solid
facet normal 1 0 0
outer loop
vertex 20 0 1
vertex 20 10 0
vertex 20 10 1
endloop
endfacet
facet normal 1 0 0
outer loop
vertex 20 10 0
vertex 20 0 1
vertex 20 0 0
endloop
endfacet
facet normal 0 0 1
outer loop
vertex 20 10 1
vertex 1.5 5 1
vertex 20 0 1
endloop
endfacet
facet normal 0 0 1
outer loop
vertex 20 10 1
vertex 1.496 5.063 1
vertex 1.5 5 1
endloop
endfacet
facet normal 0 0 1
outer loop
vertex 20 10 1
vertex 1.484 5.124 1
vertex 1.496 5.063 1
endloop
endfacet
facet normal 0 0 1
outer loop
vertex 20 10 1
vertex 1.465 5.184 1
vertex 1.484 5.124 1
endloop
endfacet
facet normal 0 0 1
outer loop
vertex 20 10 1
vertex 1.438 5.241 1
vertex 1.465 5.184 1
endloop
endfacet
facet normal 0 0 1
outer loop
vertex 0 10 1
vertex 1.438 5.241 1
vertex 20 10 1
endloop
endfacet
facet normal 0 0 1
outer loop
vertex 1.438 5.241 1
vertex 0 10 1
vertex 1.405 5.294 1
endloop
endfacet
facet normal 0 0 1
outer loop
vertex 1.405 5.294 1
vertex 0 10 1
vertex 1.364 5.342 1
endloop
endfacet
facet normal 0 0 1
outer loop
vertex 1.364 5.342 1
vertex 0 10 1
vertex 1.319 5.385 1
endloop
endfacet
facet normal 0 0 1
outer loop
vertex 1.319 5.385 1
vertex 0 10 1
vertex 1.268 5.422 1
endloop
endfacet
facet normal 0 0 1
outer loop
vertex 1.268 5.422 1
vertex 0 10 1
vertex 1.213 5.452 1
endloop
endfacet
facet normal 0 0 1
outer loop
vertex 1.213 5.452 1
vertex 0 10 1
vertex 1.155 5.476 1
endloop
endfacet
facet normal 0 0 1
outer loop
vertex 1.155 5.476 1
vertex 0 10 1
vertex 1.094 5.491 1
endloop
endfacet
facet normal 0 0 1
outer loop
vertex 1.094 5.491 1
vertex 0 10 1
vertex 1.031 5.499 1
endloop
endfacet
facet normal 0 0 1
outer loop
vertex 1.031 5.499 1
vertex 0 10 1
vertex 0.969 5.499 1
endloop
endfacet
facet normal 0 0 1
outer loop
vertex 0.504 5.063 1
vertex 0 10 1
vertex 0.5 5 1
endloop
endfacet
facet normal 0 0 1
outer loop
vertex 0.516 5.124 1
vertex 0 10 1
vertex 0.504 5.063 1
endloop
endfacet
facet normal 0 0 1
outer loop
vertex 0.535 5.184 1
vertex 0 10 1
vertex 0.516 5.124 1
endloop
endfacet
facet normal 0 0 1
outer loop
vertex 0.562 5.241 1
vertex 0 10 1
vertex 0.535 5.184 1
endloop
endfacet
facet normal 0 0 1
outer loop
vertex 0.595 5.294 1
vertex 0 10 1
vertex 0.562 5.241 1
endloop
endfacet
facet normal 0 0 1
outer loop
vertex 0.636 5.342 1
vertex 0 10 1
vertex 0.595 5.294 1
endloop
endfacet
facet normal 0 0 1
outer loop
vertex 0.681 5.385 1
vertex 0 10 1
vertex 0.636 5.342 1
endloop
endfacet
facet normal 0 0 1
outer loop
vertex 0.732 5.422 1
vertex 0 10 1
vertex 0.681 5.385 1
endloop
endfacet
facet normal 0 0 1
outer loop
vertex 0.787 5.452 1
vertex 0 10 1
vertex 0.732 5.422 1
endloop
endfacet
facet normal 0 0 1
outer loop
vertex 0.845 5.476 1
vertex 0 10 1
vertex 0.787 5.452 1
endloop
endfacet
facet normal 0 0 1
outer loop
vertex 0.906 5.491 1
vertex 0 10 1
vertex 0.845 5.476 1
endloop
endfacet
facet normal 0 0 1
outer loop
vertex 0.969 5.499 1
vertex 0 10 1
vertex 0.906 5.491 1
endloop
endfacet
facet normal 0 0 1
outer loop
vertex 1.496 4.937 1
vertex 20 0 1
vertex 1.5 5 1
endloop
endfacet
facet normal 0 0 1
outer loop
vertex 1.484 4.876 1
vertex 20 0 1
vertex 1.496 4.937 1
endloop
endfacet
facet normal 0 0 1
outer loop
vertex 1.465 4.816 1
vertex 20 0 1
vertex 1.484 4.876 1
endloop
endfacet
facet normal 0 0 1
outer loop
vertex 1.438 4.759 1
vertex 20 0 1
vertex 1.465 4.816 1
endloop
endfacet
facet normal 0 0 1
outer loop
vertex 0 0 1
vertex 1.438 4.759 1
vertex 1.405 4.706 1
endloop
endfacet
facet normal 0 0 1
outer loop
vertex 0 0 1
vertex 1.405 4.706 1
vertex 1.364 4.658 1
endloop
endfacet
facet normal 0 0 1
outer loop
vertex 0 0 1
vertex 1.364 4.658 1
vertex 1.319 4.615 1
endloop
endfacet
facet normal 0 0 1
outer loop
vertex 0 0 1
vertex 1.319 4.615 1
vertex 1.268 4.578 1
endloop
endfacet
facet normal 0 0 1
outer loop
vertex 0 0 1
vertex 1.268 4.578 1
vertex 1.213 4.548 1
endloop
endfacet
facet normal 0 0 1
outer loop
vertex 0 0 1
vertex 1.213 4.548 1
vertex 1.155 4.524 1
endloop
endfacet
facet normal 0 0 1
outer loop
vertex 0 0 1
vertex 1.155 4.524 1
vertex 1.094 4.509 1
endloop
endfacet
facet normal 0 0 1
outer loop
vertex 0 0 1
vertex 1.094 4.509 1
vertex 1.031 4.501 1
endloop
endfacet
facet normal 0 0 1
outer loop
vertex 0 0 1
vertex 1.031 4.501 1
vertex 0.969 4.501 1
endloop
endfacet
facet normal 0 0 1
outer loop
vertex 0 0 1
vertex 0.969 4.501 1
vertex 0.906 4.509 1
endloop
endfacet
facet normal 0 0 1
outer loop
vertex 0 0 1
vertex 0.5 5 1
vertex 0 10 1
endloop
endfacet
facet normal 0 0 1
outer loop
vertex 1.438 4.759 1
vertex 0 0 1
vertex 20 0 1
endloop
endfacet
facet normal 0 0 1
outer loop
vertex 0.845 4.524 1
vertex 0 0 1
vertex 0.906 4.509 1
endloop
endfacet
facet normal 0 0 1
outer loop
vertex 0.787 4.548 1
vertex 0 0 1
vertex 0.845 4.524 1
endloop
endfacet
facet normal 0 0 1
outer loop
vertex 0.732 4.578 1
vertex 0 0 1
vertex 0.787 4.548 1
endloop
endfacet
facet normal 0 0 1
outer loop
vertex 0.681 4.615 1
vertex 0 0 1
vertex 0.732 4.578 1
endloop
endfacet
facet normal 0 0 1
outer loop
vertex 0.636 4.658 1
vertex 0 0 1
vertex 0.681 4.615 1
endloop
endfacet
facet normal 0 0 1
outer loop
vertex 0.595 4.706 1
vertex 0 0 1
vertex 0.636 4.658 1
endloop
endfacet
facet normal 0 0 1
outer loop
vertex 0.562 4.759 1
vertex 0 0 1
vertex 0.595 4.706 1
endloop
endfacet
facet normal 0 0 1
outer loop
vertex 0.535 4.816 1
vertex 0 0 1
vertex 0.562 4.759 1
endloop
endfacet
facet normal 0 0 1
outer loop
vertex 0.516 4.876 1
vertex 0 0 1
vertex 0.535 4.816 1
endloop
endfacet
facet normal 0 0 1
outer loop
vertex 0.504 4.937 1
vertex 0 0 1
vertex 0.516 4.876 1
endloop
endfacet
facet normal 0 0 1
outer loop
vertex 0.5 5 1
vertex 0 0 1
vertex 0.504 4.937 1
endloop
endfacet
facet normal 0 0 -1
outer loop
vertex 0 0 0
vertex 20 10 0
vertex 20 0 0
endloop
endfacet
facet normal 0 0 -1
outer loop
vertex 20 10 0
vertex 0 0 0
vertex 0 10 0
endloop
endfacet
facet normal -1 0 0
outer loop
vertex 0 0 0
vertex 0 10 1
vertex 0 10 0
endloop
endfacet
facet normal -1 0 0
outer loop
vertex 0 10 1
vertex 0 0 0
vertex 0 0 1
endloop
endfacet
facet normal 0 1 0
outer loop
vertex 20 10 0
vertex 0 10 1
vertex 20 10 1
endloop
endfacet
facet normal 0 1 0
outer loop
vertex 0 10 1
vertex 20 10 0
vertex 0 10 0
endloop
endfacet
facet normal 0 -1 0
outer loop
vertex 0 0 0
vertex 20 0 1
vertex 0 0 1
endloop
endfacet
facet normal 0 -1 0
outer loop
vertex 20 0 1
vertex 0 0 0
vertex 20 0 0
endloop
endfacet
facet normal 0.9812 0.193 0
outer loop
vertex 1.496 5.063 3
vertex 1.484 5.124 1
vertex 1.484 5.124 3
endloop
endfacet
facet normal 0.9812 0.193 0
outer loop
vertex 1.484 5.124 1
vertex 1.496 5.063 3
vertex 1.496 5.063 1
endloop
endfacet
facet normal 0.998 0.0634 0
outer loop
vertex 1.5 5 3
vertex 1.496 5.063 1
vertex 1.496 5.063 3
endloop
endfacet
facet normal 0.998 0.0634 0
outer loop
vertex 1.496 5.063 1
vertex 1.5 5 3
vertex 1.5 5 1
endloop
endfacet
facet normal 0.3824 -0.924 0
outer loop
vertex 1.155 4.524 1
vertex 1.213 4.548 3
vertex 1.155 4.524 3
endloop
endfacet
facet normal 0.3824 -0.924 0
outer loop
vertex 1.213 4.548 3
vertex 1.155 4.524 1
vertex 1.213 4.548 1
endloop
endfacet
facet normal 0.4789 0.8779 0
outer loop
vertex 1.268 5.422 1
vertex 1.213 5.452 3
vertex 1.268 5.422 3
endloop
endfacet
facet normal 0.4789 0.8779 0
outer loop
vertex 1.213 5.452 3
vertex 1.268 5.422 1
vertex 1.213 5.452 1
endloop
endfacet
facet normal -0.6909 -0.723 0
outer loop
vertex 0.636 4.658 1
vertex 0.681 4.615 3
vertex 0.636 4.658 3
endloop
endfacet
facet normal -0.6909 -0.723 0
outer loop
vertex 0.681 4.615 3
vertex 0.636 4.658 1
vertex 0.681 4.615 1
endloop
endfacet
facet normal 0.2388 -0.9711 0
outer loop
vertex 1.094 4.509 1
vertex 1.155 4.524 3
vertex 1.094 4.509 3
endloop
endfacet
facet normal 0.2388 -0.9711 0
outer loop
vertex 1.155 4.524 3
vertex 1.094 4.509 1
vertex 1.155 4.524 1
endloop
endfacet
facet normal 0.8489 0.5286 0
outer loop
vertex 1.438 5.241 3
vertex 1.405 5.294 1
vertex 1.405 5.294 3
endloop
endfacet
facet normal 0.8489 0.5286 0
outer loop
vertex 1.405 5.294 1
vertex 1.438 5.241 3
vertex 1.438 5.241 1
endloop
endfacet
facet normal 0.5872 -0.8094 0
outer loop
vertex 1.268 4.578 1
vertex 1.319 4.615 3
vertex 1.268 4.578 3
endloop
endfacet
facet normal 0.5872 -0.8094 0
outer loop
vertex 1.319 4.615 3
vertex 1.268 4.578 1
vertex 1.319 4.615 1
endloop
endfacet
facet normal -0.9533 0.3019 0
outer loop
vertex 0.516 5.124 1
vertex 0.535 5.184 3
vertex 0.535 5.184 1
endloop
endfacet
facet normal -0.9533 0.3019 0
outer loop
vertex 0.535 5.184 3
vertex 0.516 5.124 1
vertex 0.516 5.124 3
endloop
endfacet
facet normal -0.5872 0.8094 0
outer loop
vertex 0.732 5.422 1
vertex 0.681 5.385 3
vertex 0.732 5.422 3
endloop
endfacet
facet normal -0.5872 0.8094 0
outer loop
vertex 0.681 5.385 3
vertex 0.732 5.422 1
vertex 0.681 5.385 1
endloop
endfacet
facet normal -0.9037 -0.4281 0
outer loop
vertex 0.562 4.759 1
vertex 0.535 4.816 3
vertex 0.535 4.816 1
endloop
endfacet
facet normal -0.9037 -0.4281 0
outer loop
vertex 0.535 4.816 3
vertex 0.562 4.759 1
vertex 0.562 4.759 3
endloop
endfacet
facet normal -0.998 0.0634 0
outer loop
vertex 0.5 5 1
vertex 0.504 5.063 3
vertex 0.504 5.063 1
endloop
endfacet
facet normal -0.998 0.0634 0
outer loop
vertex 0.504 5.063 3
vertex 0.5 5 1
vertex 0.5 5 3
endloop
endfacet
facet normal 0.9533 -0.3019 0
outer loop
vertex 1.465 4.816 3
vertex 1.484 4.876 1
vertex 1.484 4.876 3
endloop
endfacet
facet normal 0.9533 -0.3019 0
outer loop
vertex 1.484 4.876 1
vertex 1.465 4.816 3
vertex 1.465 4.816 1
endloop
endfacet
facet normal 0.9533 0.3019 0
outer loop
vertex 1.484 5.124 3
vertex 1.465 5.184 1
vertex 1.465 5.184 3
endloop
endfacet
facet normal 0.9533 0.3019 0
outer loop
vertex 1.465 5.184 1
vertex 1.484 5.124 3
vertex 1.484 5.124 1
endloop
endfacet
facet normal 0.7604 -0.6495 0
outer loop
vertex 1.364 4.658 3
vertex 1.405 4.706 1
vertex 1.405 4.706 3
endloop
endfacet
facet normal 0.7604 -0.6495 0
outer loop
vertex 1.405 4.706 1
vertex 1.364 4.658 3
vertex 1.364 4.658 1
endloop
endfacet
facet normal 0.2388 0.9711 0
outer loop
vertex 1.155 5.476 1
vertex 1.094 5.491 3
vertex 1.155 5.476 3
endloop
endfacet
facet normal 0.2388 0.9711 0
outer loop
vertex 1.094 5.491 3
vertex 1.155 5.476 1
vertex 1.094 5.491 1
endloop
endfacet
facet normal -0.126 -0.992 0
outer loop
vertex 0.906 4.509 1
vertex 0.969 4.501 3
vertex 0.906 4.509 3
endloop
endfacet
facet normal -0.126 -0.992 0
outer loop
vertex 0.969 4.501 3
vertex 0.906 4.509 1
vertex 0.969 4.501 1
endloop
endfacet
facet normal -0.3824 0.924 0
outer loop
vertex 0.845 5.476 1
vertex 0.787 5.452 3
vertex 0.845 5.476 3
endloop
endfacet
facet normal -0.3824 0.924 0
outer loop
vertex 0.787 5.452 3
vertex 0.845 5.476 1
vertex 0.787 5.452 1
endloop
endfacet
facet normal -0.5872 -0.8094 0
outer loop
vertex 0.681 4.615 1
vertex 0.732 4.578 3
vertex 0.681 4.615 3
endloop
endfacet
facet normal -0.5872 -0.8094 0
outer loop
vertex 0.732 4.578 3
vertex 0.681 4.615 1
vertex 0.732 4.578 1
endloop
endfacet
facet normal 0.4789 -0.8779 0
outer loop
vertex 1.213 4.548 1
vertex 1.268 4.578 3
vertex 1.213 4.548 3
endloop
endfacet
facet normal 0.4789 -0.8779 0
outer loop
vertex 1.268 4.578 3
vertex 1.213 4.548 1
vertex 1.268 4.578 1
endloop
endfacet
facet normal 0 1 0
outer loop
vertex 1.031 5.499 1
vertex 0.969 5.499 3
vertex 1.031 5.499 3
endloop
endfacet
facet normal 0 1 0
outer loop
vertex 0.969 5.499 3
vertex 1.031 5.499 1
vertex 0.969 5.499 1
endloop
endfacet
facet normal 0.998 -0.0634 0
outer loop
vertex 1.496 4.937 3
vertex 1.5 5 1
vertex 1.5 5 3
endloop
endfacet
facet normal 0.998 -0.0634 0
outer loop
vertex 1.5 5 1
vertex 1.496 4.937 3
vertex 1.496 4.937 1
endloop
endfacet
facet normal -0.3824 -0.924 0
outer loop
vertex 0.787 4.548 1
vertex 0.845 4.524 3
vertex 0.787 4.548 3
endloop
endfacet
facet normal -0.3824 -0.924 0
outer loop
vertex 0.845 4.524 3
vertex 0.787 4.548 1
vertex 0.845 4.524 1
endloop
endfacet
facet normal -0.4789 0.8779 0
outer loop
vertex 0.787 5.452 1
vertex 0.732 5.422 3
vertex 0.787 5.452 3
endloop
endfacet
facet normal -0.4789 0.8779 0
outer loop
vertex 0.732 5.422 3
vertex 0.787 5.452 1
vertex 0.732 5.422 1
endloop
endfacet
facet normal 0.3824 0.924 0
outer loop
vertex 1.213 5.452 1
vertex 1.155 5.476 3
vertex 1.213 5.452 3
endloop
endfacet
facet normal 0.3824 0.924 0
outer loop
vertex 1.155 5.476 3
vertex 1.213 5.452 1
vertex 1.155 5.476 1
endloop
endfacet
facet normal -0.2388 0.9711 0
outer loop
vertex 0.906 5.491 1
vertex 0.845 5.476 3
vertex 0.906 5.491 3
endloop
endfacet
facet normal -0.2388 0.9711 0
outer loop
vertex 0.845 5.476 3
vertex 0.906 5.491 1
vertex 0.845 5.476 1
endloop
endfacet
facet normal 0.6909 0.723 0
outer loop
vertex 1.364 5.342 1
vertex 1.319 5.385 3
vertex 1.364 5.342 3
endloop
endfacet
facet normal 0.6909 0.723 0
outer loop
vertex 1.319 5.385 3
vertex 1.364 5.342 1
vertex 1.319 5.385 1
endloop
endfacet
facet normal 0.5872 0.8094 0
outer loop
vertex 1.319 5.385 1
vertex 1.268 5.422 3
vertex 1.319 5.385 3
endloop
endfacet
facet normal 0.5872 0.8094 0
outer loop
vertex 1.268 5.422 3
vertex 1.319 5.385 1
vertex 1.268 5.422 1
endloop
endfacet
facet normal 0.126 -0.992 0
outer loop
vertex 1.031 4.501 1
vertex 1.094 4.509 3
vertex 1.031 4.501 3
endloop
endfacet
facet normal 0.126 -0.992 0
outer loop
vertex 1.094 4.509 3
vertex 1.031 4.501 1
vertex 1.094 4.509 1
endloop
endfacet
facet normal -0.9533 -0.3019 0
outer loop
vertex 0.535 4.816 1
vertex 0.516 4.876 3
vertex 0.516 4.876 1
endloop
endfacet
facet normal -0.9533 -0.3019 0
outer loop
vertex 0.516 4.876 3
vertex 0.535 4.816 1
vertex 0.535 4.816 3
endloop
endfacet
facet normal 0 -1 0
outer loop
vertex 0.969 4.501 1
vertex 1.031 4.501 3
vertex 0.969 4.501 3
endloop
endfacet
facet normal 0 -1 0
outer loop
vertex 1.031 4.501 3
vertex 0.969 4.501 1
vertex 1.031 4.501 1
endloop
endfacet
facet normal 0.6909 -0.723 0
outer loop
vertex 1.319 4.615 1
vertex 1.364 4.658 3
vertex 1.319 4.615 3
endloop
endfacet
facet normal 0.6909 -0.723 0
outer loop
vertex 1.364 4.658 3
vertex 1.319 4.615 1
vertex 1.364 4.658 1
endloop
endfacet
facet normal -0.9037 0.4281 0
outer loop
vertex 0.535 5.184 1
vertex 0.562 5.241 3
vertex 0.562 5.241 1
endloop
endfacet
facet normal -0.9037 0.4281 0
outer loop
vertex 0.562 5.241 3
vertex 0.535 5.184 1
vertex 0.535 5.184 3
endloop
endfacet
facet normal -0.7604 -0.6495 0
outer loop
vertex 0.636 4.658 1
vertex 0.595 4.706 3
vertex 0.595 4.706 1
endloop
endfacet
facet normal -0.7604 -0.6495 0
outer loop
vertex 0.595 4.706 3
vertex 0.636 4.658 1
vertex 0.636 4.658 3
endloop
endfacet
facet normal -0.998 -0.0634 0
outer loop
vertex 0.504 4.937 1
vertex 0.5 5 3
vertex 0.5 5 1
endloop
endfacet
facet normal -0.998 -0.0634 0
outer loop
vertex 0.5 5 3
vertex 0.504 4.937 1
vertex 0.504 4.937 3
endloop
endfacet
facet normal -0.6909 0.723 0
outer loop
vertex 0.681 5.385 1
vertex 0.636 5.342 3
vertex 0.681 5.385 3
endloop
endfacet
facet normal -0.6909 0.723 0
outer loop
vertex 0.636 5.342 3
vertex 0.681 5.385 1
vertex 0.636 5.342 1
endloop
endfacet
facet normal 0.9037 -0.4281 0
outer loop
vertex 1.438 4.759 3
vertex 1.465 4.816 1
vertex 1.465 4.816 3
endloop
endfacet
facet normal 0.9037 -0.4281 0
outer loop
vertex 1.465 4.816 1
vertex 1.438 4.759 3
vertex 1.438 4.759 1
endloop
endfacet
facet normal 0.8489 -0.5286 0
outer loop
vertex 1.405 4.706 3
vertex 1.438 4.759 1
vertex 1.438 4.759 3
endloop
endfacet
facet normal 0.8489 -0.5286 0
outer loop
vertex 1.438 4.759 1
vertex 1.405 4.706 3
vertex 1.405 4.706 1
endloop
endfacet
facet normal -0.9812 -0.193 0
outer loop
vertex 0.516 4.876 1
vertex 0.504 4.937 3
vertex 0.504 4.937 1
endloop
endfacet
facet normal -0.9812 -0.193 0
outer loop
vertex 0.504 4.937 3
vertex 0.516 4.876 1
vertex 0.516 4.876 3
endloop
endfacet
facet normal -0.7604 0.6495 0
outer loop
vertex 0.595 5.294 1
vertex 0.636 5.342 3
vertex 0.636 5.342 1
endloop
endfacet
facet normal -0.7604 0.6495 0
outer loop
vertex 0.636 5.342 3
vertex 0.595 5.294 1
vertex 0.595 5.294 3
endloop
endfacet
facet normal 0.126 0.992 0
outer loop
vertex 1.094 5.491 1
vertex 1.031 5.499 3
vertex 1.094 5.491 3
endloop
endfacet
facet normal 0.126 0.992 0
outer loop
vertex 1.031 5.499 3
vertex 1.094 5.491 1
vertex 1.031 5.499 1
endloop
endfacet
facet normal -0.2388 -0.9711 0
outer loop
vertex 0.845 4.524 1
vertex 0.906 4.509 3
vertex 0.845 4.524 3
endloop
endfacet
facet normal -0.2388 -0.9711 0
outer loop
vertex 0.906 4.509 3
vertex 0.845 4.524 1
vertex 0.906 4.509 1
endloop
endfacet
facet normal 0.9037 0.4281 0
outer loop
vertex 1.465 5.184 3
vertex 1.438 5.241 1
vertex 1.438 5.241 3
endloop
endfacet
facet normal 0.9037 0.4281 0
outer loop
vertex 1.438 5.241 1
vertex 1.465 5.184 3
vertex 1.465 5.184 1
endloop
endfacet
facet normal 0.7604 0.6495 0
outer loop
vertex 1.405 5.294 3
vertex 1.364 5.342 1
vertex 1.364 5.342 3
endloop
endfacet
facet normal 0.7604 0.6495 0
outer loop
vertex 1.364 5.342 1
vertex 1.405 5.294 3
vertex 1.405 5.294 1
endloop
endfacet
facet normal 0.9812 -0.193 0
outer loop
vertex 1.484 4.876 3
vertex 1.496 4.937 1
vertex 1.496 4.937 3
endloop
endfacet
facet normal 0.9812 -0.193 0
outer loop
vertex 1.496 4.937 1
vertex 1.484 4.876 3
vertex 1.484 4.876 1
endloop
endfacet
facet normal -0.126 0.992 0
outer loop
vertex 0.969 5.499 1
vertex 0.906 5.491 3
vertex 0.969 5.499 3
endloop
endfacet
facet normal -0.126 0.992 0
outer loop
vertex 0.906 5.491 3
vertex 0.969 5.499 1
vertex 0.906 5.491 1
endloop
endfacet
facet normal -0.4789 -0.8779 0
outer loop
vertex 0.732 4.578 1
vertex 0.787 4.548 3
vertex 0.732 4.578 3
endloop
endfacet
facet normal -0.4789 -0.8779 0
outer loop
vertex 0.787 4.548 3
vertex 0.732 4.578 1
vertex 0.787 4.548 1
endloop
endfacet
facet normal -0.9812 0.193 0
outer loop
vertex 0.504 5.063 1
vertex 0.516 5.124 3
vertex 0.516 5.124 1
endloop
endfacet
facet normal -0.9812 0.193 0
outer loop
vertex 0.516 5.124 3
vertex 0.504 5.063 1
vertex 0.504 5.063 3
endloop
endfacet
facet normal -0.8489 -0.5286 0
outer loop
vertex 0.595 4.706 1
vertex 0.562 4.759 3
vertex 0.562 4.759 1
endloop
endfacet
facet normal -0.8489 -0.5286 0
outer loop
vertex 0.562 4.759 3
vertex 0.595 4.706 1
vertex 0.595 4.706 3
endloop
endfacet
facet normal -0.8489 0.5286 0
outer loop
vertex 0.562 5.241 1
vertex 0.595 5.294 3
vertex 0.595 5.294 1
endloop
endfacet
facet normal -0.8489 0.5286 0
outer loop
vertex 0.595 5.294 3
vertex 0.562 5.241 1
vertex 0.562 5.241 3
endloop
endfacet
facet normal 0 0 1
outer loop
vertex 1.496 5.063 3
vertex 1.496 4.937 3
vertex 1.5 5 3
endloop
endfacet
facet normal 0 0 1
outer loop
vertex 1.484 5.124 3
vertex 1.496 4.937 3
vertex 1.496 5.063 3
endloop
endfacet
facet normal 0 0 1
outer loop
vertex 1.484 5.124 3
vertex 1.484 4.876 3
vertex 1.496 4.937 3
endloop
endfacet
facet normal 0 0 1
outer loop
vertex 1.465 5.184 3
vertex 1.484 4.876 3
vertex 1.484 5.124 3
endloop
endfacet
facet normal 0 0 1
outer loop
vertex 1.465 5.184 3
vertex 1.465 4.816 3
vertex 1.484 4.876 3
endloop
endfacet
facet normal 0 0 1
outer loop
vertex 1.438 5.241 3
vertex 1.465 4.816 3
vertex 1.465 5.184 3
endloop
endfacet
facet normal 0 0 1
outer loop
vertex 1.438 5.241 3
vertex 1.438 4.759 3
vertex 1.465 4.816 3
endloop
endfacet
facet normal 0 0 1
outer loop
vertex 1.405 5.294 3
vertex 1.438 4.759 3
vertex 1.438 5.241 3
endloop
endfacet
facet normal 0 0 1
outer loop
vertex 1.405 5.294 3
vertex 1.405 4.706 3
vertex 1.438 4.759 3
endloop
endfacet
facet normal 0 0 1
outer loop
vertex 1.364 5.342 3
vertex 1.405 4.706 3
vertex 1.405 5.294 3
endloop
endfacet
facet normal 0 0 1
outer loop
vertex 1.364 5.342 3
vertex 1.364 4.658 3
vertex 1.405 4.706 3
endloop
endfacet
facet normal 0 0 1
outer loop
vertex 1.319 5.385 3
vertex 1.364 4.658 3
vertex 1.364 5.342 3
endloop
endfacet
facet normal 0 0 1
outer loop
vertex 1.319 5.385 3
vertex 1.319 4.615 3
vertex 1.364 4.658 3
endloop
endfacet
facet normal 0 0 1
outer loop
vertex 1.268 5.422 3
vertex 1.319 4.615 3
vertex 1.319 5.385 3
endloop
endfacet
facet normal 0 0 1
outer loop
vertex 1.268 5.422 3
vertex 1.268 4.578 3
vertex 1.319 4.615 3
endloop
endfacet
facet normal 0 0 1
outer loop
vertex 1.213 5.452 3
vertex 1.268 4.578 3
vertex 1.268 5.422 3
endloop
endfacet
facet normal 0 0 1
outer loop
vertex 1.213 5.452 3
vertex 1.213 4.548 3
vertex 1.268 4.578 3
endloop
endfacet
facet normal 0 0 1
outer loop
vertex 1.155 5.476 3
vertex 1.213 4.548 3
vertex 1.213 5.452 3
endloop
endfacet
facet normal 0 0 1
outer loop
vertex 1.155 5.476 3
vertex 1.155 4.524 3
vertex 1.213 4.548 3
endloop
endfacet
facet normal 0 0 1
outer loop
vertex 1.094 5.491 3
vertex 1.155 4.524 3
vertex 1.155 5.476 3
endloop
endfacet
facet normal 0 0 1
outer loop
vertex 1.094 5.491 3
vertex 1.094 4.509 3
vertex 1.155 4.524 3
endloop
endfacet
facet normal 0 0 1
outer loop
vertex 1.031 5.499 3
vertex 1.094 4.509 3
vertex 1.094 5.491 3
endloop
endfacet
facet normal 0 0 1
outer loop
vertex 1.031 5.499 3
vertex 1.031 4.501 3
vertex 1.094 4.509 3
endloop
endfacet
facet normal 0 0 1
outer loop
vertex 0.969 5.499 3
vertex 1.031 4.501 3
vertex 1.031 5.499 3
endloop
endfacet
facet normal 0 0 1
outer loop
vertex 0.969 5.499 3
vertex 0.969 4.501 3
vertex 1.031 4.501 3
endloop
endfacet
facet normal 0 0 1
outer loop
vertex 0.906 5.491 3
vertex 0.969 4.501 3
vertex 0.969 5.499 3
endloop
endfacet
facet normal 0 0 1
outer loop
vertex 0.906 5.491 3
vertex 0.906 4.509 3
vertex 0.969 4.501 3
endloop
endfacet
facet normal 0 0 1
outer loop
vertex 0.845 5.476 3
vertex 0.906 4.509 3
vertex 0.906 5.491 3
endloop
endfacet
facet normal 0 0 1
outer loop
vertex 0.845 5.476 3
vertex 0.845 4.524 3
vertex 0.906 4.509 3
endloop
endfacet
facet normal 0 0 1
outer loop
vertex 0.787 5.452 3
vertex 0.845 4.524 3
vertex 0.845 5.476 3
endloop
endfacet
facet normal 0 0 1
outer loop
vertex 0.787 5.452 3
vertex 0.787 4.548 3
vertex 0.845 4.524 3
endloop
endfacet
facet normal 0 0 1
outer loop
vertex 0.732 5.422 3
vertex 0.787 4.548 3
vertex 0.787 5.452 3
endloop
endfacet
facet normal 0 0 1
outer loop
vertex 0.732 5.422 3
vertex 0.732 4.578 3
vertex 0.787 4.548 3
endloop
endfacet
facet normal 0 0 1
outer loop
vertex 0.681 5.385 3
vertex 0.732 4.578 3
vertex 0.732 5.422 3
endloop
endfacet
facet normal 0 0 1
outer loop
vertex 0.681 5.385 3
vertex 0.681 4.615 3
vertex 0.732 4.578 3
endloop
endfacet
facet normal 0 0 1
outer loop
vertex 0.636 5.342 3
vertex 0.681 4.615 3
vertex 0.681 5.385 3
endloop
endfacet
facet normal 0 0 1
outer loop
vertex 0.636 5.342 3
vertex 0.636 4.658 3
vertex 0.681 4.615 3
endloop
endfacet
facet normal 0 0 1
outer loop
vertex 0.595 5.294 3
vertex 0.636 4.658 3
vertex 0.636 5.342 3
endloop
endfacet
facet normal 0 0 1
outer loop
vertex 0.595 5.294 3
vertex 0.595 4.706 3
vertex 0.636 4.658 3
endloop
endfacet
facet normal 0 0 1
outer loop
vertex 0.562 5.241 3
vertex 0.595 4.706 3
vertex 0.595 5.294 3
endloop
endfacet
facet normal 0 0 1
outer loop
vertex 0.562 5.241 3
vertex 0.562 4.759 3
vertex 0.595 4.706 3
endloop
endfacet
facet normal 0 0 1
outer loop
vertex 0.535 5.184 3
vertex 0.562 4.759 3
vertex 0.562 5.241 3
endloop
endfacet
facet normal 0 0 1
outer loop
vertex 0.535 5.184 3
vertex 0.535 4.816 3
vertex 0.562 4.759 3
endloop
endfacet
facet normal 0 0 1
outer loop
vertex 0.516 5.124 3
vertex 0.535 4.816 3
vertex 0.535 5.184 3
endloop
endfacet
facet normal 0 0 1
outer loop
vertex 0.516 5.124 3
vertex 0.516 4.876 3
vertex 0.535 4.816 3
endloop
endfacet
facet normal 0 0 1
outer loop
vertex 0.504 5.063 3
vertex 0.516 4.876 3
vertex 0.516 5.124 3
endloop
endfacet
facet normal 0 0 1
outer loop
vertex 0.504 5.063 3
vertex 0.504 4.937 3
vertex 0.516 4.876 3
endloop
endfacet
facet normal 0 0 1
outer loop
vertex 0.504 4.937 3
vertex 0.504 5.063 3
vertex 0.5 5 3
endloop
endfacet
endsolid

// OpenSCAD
module base()
{
	cube([20, 10, 1]);
	translate([1,5,1])
		cylinder(r=0.5, h=2, $fn=50);
}

module sway(){
	difference(){
		cylinder(r=1, h=1, $fn=50);
		cylinder(r=0.7, h=2, $fn=50);
	}
	translate([0.7, -0.5, 0])
		cube([15,1,1]);

	translate([15,-2.5,0])
		cube([3,5,1]);
}

base();

translate([1,13,0])
	rotate([0,0,0]) //can adjust
	%sway();
